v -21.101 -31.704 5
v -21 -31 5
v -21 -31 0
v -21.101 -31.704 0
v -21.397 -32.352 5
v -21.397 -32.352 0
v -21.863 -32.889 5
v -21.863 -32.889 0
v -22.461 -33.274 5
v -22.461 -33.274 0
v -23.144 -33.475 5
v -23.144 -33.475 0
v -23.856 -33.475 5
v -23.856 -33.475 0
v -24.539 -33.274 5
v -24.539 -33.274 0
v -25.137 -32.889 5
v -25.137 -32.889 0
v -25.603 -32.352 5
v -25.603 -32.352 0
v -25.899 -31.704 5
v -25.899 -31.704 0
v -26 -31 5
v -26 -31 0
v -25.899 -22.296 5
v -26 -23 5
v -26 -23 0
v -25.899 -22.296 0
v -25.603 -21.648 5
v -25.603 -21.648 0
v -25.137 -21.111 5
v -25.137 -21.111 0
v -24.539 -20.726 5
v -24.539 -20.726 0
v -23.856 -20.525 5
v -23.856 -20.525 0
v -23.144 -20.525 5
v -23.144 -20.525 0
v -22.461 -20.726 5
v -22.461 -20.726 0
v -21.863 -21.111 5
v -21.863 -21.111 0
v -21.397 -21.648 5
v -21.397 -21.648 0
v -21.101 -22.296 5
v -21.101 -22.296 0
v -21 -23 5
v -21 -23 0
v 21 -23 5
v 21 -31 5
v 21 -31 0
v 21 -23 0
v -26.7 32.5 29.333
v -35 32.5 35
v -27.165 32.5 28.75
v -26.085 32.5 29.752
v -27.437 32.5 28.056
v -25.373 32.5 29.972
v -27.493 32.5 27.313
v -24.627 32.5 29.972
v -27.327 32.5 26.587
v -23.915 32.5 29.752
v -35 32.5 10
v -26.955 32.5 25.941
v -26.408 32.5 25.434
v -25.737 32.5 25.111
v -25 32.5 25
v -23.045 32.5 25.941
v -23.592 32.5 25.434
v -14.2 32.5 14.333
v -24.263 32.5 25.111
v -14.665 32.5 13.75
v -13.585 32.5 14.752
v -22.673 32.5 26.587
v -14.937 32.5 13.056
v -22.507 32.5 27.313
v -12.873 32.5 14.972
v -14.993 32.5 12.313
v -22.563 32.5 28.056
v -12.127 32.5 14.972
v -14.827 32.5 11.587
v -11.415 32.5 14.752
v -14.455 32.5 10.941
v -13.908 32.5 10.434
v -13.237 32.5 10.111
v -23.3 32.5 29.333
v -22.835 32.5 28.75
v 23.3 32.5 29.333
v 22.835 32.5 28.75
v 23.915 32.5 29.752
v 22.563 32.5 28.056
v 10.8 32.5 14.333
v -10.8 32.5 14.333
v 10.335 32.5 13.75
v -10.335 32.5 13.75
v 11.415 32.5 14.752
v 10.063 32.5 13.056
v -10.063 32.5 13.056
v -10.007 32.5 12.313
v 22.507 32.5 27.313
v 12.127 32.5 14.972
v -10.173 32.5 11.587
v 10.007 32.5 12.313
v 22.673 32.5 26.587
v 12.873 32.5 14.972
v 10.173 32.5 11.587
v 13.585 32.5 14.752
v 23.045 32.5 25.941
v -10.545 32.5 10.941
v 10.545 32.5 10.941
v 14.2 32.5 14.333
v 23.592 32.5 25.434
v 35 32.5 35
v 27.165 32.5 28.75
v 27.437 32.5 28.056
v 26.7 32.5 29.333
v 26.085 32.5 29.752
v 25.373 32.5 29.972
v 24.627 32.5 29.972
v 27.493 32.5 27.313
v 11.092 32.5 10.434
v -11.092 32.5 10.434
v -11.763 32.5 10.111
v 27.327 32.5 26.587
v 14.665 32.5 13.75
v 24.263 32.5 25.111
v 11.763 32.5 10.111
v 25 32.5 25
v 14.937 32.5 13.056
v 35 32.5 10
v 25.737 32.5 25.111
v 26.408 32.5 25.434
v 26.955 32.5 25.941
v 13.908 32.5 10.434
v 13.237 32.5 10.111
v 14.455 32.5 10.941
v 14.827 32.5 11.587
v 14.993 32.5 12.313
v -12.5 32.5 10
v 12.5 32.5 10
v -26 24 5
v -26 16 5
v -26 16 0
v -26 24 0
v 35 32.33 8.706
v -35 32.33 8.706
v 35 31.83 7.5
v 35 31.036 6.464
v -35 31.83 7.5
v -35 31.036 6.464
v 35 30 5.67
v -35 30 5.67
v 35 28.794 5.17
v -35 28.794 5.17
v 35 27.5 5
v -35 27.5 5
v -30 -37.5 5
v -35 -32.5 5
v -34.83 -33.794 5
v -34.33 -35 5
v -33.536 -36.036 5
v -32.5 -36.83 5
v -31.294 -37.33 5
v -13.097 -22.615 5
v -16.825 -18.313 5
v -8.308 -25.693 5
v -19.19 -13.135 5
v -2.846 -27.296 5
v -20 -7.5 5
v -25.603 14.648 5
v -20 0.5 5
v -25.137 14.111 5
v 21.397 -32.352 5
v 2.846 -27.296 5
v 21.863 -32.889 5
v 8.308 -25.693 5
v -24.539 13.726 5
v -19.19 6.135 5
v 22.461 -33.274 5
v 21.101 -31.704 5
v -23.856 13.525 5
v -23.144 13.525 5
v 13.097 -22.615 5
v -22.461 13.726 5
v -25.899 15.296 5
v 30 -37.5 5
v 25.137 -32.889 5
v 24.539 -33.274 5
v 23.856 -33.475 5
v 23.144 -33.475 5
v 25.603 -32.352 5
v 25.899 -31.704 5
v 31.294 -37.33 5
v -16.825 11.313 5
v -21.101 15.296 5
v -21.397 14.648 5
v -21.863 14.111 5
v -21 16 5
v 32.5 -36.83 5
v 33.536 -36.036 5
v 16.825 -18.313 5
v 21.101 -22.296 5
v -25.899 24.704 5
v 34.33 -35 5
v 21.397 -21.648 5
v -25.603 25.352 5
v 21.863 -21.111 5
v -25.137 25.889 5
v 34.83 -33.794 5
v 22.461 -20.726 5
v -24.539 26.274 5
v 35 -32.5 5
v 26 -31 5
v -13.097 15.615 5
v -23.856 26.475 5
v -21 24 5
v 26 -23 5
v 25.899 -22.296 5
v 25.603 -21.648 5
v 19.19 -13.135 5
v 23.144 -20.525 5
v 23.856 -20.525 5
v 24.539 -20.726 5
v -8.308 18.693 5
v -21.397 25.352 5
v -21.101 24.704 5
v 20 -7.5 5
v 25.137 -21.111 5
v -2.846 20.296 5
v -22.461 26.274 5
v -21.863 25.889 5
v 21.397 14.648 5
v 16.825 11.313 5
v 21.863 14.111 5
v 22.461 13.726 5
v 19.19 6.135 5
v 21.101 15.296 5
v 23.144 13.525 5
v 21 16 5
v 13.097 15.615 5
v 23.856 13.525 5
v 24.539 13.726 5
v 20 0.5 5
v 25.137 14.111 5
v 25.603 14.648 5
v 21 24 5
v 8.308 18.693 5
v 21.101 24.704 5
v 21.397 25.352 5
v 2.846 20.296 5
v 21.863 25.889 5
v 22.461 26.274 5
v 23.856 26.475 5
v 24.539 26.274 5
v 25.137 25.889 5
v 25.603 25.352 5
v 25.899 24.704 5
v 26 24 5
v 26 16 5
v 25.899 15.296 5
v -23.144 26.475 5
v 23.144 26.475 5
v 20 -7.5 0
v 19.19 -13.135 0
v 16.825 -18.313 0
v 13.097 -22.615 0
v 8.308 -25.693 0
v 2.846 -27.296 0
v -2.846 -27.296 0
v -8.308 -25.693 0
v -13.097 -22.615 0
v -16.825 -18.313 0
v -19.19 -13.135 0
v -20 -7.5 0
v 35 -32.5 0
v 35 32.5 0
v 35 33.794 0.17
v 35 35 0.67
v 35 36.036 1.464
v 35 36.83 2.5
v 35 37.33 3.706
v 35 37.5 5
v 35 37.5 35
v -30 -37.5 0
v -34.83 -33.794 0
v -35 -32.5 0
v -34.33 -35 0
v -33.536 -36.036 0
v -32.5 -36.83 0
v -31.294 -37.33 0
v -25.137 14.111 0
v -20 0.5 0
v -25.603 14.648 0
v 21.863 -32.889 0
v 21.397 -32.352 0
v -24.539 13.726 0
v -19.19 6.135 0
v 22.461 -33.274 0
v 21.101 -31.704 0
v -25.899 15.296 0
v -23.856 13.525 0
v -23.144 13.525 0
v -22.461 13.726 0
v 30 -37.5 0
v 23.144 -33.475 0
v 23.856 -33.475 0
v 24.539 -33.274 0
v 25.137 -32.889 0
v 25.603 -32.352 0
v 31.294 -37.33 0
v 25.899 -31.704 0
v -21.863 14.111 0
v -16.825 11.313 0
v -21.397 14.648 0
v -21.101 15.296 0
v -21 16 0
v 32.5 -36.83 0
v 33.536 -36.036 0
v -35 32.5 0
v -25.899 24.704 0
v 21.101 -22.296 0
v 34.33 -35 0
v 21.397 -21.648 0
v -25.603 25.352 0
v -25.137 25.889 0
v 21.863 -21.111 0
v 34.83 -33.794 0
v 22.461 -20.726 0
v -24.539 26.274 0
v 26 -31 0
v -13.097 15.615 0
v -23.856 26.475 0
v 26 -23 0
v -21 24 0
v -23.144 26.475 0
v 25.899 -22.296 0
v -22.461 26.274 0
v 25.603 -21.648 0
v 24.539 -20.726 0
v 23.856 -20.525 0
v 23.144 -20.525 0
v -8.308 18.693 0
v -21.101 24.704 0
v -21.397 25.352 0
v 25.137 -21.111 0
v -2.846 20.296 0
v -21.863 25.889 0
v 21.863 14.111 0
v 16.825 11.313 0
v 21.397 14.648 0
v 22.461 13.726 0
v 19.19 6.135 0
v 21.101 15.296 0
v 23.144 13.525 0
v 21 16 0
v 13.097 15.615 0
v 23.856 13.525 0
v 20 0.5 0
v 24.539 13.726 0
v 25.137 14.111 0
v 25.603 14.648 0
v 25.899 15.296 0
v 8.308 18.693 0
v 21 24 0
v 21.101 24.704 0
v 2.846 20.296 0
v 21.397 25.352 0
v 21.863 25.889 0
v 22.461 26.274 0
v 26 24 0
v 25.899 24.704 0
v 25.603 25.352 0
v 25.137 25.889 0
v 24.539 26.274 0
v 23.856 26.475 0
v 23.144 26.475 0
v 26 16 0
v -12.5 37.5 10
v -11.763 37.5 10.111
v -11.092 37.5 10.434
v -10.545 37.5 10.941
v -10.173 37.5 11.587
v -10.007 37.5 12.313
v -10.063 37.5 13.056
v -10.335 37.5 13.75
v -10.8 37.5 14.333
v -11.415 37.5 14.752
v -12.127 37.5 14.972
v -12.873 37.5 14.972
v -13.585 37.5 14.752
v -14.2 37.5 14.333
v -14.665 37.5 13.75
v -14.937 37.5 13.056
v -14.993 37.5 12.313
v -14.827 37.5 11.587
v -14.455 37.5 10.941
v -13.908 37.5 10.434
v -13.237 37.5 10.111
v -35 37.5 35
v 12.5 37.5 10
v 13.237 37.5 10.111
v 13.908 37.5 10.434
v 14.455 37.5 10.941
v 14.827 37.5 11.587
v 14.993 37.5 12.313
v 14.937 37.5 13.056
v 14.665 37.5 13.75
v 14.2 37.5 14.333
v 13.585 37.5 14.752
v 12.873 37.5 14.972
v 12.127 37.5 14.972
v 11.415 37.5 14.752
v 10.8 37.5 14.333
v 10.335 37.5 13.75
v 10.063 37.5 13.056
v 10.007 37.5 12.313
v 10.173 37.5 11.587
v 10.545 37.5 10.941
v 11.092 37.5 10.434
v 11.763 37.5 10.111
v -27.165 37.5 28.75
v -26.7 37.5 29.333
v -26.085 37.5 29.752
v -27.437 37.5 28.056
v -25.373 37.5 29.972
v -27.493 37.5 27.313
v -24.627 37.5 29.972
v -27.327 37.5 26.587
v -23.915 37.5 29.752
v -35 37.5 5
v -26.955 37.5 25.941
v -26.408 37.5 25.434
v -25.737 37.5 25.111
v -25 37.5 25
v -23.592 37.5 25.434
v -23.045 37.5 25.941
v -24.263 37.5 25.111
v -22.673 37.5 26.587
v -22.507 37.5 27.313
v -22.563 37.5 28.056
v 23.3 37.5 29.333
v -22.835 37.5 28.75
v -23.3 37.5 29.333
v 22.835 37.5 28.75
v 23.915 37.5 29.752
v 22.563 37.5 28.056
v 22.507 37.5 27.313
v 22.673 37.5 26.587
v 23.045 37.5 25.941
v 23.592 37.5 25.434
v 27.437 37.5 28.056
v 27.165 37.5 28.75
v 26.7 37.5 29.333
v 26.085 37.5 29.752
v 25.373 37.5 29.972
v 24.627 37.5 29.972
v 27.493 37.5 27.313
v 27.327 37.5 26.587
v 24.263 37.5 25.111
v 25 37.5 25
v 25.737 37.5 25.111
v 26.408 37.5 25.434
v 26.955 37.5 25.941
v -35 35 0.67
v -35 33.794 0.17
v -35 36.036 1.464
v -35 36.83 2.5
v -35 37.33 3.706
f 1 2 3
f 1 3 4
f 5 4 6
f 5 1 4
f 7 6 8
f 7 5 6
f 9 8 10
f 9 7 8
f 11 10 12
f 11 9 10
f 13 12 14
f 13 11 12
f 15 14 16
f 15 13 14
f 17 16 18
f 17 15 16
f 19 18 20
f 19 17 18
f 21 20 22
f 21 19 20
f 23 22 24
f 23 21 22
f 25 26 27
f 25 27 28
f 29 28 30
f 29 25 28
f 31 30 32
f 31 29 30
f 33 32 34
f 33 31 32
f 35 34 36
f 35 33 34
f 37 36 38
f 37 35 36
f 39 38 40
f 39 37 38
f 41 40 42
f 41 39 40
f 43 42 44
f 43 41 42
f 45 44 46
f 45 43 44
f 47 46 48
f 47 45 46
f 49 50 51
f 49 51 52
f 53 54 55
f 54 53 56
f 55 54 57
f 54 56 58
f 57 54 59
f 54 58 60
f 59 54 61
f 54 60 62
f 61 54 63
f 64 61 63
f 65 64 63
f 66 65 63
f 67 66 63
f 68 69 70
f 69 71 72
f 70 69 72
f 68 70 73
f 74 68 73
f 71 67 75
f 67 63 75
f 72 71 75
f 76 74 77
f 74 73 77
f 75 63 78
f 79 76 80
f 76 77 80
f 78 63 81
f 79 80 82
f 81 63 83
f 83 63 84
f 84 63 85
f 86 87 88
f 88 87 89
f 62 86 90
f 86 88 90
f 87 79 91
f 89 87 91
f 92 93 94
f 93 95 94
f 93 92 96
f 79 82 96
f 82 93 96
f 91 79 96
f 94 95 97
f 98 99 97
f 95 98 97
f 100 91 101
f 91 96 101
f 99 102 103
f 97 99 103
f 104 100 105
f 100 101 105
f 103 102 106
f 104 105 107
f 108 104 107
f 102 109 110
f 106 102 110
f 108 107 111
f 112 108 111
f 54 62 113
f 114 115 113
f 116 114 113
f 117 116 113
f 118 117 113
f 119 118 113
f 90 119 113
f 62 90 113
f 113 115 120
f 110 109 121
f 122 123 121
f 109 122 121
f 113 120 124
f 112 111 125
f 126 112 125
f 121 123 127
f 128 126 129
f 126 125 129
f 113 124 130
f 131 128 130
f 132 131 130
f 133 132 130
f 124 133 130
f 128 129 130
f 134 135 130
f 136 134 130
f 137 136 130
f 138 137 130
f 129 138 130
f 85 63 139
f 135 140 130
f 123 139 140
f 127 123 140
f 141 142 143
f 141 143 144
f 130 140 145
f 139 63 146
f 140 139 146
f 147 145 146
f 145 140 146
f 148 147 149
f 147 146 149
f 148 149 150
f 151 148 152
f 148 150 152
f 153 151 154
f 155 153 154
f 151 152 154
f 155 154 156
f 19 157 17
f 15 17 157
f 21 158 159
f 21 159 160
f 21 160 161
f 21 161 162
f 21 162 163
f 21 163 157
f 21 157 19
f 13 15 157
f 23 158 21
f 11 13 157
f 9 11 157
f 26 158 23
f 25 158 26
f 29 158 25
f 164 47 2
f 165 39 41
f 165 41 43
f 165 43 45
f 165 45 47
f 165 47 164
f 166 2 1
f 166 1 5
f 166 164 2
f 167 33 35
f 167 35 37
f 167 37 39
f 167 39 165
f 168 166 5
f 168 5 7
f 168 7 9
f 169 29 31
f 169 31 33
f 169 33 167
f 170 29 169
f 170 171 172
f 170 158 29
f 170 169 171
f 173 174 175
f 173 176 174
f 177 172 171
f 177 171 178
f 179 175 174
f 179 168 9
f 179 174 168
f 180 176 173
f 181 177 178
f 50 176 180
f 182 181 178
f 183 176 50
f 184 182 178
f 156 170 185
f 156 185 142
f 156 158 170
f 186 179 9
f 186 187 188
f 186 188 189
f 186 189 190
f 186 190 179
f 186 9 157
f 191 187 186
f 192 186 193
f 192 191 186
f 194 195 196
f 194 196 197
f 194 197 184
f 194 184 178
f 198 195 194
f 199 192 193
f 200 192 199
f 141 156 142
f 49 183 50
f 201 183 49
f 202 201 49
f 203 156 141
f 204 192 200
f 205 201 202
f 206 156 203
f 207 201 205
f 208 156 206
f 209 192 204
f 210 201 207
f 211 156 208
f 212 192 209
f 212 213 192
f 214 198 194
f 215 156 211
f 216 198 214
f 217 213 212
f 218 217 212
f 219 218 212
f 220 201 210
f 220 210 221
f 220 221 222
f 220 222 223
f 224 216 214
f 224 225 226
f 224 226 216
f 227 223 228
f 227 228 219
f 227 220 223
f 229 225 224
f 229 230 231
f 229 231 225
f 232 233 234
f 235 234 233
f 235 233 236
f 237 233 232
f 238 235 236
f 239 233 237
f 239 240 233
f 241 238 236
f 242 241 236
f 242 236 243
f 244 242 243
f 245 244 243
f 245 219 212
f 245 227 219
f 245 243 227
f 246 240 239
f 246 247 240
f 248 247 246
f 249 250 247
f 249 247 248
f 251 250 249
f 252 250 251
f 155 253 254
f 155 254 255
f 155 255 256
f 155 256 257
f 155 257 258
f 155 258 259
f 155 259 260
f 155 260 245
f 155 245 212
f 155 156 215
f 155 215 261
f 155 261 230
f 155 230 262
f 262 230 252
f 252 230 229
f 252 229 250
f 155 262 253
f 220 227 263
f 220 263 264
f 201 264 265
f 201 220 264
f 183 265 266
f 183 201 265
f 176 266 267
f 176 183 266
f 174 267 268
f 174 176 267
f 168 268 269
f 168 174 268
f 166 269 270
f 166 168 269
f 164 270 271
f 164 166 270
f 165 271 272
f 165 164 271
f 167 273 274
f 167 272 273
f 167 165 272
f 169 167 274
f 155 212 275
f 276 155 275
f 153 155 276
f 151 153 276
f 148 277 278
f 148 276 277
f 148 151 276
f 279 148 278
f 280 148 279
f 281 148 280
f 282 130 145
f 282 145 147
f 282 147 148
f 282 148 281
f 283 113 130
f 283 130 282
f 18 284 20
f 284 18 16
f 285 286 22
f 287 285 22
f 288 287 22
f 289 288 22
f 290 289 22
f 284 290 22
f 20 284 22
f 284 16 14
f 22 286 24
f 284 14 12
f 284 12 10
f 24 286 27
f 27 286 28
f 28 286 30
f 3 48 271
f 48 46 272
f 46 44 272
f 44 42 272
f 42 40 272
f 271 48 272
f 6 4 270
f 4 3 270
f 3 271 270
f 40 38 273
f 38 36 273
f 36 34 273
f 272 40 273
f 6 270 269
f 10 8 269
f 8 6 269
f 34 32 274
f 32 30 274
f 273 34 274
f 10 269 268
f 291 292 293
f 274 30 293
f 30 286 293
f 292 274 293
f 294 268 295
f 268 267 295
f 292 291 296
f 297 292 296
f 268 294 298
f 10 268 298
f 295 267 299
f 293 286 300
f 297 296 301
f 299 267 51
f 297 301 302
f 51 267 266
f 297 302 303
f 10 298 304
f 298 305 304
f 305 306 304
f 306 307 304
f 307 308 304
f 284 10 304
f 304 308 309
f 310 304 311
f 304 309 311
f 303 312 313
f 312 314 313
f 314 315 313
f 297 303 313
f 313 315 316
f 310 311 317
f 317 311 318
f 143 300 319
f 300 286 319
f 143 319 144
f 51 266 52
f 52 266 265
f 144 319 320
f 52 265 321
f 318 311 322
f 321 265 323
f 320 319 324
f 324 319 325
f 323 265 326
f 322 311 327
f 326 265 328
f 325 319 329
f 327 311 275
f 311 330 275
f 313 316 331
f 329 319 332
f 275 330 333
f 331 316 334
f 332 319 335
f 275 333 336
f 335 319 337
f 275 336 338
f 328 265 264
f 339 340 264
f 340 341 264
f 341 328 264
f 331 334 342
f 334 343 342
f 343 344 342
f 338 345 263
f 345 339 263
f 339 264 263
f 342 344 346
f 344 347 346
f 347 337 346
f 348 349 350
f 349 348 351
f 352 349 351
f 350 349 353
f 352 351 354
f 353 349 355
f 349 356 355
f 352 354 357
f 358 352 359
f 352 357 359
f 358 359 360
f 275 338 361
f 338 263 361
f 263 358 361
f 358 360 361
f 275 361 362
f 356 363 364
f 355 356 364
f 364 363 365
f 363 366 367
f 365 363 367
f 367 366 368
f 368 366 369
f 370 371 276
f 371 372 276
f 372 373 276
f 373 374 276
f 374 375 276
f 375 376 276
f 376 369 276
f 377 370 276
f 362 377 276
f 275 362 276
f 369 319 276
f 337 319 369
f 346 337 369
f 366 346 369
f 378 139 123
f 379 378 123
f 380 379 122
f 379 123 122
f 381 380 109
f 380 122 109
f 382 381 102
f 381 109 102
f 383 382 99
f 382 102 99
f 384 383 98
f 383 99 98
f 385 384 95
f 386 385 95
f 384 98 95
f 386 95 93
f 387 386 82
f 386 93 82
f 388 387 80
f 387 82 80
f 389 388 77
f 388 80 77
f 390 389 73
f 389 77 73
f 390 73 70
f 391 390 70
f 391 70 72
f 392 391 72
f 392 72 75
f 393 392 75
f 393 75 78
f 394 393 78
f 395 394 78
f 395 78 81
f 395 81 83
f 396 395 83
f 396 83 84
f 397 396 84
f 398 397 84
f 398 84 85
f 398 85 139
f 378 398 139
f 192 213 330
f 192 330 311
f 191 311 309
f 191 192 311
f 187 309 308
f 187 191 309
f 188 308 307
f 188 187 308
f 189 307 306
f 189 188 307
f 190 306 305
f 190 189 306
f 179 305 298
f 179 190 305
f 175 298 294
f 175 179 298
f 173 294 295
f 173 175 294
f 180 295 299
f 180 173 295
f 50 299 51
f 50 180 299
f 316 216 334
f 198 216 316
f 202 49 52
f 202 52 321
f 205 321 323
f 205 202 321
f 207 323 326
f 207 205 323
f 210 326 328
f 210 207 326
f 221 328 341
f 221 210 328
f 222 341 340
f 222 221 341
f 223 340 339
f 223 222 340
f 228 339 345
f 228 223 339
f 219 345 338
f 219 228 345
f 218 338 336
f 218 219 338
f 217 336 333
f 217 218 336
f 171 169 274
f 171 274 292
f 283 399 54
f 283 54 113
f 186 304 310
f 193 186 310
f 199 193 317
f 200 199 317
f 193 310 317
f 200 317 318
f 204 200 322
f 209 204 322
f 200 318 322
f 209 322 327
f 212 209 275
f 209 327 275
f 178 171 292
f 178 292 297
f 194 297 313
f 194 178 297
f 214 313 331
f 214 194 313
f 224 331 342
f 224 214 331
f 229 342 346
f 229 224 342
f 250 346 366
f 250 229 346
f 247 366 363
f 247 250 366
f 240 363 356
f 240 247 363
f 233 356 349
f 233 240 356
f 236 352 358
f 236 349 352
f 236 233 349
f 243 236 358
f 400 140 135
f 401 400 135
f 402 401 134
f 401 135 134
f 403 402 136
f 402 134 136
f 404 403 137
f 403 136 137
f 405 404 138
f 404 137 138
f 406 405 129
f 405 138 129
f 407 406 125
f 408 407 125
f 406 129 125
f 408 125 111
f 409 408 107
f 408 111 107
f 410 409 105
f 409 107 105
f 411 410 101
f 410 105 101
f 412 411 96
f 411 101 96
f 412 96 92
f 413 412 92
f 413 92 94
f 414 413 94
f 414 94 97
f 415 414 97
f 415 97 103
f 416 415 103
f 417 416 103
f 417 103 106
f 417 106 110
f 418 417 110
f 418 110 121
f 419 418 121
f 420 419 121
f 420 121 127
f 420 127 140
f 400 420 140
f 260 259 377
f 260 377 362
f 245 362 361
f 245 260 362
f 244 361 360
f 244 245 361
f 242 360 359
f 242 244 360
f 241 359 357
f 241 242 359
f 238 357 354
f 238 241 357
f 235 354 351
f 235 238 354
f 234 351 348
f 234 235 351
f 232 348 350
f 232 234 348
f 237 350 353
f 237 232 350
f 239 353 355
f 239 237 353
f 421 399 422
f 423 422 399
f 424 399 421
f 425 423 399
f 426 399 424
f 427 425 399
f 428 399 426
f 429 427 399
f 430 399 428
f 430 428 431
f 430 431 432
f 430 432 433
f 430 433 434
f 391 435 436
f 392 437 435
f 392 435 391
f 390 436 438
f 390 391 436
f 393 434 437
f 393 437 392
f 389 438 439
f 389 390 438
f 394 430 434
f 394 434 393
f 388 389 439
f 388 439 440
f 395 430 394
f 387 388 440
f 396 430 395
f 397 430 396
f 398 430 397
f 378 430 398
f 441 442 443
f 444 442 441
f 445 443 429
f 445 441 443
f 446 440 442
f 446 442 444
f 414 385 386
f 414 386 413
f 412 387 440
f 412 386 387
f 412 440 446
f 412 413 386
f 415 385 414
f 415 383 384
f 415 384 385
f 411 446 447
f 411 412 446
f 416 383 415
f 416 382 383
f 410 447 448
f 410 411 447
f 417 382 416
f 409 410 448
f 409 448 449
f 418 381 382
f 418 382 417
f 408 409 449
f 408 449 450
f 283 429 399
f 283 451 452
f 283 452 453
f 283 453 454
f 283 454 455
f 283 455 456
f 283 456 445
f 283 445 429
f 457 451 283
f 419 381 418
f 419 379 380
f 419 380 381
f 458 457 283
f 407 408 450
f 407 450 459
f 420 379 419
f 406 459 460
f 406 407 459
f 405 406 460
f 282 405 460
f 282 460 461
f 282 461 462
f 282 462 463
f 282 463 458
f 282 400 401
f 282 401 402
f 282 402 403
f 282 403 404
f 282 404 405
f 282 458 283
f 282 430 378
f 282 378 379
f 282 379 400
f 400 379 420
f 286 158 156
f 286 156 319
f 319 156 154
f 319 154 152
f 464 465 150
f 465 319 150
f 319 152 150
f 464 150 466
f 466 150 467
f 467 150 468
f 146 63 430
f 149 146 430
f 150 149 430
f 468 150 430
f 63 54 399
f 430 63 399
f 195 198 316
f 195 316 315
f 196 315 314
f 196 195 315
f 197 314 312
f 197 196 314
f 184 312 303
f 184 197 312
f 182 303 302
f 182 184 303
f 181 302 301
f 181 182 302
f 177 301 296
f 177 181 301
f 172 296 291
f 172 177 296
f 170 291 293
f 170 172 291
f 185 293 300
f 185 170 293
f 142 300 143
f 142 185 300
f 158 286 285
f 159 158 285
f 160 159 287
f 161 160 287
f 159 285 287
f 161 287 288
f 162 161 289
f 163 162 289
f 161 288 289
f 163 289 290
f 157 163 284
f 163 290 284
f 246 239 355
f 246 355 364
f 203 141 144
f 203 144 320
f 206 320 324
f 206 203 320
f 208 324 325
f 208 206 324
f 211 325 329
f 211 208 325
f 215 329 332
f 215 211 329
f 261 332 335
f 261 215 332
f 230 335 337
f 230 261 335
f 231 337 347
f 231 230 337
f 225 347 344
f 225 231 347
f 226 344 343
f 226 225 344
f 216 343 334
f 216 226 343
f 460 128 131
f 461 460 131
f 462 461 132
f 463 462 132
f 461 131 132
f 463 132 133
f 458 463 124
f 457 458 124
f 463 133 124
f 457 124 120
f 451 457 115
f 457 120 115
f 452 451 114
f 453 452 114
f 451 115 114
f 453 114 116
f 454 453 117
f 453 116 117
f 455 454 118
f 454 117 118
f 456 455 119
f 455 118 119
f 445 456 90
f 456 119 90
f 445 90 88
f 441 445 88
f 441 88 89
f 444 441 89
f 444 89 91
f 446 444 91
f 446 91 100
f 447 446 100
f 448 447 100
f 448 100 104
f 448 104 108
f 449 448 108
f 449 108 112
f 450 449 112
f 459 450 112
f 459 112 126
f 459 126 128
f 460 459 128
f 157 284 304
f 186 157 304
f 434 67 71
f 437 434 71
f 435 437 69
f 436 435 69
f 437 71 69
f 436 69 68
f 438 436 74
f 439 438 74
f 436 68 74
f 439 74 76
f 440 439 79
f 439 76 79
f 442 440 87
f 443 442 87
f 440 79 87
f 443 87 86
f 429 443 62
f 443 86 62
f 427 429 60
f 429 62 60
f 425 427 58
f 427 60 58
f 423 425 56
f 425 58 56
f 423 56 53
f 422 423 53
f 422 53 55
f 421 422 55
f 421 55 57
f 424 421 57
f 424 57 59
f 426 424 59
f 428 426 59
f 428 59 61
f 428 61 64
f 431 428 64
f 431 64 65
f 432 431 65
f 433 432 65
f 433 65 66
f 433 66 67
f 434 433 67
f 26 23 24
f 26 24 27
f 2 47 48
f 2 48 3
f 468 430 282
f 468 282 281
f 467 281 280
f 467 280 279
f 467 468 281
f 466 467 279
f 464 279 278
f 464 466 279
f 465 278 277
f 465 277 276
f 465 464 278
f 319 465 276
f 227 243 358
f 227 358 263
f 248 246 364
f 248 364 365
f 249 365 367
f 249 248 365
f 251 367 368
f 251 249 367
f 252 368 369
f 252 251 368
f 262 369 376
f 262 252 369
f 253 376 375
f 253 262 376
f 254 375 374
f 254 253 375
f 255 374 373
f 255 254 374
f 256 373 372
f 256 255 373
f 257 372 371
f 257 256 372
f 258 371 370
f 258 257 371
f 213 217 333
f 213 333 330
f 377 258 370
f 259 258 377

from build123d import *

# Parameters (mm, degrees)
BOSS_EXTRUDE1_DEPTH = 5
CUT_EXTRUDE1_DEPTH  = 52.53882032022076
BOSS_EXTRUDE2_DEPTH = 30
SKETCH5_R           = 2.4999999999999987
SKETCH5_R_2         = 2.4999999999999982
CUT_EXTRUDE2_DEPTH  = 30
FILLET1_R           = 5


with BuildPart() as part:
    # Sketch2 → Boss-Extrude1 (new body)
    with BuildSketch(Plane.XY):
        with BuildLine():
            Line((-29.999999999999975, -37.499999999999986), (30, -37.499999999999986))
            ThreePointArc((30, -37.499999999999986), (33.53553390593274, -36.03553390593272), (35, -32.499999999999986))
            Line((35, -32.499999999999986), (35, 37.5))
            Line((35, 37.5), (-34.99999999999998, 37.5))
            Line((-34.99999999999998, 37.5), (-34.99999999999998, -32.499999999999986))
            ThreePointArc((-34.99999999999998, -32.499999999999986), (-33.53553390593271, -36.03553390593272), (-29.999999999999975, -37.499999999999986))
        make_face()
    extrude(amount=BOSS_EXTRUDE1_DEPTH)

    # Sketch3 → Cut-Extrude1 (cut, through all)
    with BuildSketch(Plane.XY.offset(5)):
        with BuildLine():
            Line((-21.000000000000007, 24), (-21.000000000000007, 16))
            ThreePointArc((-21.000000000000007, 16), (-23.500000000000007, 13.500000000000018), (-25.99999999999999, 16))
            Line((-25.99999999999999, 16), (-25.99999999999999, 24))
            ThreePointArc((-25.99999999999999, 24), (-23.500000000000007, 26.5), (-21.000000000000007, 24))
        make_face()
        with BuildLine():
            Line((-20.999999999999993, -23), (-20.999999999999993, -31))
            ThreePointArc((-20.999999999999993, -31), (-23.499999999999996, -33.5), (-25.999999999999996, -31))
            Line((-25.999999999999996, -31), (-25.999999999999996, -23))
            ThreePointArc((-25.999999999999996, -23), (-23.499999999999996, -20.499999999999996), (-20.999999999999993, -23))
        make_face()
        with BuildLine():
            Line((25.999999999999993, 24), (25.999999999999993, 16))
            ThreePointArc((25.999999999999993, 16), (23.499999999999993, 13.500000000000018), (21.00000000000001, 16))
            Line((21.00000000000001, 16), (21.00000000000001, 24))
            ThreePointArc((21.00000000000001, 24), (23.499999999999993, 26.5), (25.999999999999993, 24))
        make_face()
        with BuildLine():
            Line((26.000000000000007, -23), (26.000000000000007, -31))
            ThreePointArc((26.000000000000007, -31), (23.500000000000004, -33.5), (21.000000000000004, -31))
            Line((21.000000000000004, -31), (21.000000000000004, -23))
            ThreePointArc((21.000000000000004, -23), (23.500000000000004, -20.499999999999996), (26.000000000000007, -23))
        make_face()
        with BuildLine():
            Line((20.000000000000004, 0.49999999999999784), (20.000000000000004, -7.499999999999997))
            ThreePointArc((20.000000000000004, -7.499999999999997), (1.22e-15, -27.500000000000004), (-20.000000000000004, -7.500000000000003))
            Line((-20.000000000000004, -7.500000000000003), (-20.000000000000004, 0.500000000000003))
            ThreePointArc((-20.000000000000004, 0.500000000000003), (5.67e-15, 20.500000000000004), (20.000000000000004, 0.49999999999999784))
        make_face()
    extrude(amount=-CUT_EXTRUDE1_DEPTH, mode=Mode.SUBTRACT)

    # Sketch4 → Boss-Extrude2 (add)
    with BuildSketch(Plane.XY.offset(5)):
        Polygon((-34.99999999999998, 37.5), (-34.99999999999998, 32.5), (35, 32.5), (35, 37.49999999999999), align=None)
    extrude(amount=BOSS_EXTRUDE2_DEPTH)

    # Sketch5 → Cut-Extrude2 (cut)
    with BuildSketch(Plane.XZ.offset(-32.5)):
        with Locations((-12.5, 12.5)):
            Circle(SKETCH5_R)
        with Locations((12.5, 12.5)):
            Circle(SKETCH5_R)
        with Locations((-25, 27.5)):
            Circle(SKETCH5_R_2)
        with Locations((25, 27.5)):
            Circle(SKETCH5_R_2)
    extrude(amount=-CUT_EXTRUDE2_DEPTH, mode=Mode.SUBTRACT)

    # Fillet1
    fillet1_edges = [part.edges().sort_by_distance(p)[0] for p in [
        (7.11e-15, 32.5, 5),
        (1.421e-14, 37.5, 0),
    ]]
    fillet(fillet1_edges, radius=FILLET1_R)


solid = part.part
